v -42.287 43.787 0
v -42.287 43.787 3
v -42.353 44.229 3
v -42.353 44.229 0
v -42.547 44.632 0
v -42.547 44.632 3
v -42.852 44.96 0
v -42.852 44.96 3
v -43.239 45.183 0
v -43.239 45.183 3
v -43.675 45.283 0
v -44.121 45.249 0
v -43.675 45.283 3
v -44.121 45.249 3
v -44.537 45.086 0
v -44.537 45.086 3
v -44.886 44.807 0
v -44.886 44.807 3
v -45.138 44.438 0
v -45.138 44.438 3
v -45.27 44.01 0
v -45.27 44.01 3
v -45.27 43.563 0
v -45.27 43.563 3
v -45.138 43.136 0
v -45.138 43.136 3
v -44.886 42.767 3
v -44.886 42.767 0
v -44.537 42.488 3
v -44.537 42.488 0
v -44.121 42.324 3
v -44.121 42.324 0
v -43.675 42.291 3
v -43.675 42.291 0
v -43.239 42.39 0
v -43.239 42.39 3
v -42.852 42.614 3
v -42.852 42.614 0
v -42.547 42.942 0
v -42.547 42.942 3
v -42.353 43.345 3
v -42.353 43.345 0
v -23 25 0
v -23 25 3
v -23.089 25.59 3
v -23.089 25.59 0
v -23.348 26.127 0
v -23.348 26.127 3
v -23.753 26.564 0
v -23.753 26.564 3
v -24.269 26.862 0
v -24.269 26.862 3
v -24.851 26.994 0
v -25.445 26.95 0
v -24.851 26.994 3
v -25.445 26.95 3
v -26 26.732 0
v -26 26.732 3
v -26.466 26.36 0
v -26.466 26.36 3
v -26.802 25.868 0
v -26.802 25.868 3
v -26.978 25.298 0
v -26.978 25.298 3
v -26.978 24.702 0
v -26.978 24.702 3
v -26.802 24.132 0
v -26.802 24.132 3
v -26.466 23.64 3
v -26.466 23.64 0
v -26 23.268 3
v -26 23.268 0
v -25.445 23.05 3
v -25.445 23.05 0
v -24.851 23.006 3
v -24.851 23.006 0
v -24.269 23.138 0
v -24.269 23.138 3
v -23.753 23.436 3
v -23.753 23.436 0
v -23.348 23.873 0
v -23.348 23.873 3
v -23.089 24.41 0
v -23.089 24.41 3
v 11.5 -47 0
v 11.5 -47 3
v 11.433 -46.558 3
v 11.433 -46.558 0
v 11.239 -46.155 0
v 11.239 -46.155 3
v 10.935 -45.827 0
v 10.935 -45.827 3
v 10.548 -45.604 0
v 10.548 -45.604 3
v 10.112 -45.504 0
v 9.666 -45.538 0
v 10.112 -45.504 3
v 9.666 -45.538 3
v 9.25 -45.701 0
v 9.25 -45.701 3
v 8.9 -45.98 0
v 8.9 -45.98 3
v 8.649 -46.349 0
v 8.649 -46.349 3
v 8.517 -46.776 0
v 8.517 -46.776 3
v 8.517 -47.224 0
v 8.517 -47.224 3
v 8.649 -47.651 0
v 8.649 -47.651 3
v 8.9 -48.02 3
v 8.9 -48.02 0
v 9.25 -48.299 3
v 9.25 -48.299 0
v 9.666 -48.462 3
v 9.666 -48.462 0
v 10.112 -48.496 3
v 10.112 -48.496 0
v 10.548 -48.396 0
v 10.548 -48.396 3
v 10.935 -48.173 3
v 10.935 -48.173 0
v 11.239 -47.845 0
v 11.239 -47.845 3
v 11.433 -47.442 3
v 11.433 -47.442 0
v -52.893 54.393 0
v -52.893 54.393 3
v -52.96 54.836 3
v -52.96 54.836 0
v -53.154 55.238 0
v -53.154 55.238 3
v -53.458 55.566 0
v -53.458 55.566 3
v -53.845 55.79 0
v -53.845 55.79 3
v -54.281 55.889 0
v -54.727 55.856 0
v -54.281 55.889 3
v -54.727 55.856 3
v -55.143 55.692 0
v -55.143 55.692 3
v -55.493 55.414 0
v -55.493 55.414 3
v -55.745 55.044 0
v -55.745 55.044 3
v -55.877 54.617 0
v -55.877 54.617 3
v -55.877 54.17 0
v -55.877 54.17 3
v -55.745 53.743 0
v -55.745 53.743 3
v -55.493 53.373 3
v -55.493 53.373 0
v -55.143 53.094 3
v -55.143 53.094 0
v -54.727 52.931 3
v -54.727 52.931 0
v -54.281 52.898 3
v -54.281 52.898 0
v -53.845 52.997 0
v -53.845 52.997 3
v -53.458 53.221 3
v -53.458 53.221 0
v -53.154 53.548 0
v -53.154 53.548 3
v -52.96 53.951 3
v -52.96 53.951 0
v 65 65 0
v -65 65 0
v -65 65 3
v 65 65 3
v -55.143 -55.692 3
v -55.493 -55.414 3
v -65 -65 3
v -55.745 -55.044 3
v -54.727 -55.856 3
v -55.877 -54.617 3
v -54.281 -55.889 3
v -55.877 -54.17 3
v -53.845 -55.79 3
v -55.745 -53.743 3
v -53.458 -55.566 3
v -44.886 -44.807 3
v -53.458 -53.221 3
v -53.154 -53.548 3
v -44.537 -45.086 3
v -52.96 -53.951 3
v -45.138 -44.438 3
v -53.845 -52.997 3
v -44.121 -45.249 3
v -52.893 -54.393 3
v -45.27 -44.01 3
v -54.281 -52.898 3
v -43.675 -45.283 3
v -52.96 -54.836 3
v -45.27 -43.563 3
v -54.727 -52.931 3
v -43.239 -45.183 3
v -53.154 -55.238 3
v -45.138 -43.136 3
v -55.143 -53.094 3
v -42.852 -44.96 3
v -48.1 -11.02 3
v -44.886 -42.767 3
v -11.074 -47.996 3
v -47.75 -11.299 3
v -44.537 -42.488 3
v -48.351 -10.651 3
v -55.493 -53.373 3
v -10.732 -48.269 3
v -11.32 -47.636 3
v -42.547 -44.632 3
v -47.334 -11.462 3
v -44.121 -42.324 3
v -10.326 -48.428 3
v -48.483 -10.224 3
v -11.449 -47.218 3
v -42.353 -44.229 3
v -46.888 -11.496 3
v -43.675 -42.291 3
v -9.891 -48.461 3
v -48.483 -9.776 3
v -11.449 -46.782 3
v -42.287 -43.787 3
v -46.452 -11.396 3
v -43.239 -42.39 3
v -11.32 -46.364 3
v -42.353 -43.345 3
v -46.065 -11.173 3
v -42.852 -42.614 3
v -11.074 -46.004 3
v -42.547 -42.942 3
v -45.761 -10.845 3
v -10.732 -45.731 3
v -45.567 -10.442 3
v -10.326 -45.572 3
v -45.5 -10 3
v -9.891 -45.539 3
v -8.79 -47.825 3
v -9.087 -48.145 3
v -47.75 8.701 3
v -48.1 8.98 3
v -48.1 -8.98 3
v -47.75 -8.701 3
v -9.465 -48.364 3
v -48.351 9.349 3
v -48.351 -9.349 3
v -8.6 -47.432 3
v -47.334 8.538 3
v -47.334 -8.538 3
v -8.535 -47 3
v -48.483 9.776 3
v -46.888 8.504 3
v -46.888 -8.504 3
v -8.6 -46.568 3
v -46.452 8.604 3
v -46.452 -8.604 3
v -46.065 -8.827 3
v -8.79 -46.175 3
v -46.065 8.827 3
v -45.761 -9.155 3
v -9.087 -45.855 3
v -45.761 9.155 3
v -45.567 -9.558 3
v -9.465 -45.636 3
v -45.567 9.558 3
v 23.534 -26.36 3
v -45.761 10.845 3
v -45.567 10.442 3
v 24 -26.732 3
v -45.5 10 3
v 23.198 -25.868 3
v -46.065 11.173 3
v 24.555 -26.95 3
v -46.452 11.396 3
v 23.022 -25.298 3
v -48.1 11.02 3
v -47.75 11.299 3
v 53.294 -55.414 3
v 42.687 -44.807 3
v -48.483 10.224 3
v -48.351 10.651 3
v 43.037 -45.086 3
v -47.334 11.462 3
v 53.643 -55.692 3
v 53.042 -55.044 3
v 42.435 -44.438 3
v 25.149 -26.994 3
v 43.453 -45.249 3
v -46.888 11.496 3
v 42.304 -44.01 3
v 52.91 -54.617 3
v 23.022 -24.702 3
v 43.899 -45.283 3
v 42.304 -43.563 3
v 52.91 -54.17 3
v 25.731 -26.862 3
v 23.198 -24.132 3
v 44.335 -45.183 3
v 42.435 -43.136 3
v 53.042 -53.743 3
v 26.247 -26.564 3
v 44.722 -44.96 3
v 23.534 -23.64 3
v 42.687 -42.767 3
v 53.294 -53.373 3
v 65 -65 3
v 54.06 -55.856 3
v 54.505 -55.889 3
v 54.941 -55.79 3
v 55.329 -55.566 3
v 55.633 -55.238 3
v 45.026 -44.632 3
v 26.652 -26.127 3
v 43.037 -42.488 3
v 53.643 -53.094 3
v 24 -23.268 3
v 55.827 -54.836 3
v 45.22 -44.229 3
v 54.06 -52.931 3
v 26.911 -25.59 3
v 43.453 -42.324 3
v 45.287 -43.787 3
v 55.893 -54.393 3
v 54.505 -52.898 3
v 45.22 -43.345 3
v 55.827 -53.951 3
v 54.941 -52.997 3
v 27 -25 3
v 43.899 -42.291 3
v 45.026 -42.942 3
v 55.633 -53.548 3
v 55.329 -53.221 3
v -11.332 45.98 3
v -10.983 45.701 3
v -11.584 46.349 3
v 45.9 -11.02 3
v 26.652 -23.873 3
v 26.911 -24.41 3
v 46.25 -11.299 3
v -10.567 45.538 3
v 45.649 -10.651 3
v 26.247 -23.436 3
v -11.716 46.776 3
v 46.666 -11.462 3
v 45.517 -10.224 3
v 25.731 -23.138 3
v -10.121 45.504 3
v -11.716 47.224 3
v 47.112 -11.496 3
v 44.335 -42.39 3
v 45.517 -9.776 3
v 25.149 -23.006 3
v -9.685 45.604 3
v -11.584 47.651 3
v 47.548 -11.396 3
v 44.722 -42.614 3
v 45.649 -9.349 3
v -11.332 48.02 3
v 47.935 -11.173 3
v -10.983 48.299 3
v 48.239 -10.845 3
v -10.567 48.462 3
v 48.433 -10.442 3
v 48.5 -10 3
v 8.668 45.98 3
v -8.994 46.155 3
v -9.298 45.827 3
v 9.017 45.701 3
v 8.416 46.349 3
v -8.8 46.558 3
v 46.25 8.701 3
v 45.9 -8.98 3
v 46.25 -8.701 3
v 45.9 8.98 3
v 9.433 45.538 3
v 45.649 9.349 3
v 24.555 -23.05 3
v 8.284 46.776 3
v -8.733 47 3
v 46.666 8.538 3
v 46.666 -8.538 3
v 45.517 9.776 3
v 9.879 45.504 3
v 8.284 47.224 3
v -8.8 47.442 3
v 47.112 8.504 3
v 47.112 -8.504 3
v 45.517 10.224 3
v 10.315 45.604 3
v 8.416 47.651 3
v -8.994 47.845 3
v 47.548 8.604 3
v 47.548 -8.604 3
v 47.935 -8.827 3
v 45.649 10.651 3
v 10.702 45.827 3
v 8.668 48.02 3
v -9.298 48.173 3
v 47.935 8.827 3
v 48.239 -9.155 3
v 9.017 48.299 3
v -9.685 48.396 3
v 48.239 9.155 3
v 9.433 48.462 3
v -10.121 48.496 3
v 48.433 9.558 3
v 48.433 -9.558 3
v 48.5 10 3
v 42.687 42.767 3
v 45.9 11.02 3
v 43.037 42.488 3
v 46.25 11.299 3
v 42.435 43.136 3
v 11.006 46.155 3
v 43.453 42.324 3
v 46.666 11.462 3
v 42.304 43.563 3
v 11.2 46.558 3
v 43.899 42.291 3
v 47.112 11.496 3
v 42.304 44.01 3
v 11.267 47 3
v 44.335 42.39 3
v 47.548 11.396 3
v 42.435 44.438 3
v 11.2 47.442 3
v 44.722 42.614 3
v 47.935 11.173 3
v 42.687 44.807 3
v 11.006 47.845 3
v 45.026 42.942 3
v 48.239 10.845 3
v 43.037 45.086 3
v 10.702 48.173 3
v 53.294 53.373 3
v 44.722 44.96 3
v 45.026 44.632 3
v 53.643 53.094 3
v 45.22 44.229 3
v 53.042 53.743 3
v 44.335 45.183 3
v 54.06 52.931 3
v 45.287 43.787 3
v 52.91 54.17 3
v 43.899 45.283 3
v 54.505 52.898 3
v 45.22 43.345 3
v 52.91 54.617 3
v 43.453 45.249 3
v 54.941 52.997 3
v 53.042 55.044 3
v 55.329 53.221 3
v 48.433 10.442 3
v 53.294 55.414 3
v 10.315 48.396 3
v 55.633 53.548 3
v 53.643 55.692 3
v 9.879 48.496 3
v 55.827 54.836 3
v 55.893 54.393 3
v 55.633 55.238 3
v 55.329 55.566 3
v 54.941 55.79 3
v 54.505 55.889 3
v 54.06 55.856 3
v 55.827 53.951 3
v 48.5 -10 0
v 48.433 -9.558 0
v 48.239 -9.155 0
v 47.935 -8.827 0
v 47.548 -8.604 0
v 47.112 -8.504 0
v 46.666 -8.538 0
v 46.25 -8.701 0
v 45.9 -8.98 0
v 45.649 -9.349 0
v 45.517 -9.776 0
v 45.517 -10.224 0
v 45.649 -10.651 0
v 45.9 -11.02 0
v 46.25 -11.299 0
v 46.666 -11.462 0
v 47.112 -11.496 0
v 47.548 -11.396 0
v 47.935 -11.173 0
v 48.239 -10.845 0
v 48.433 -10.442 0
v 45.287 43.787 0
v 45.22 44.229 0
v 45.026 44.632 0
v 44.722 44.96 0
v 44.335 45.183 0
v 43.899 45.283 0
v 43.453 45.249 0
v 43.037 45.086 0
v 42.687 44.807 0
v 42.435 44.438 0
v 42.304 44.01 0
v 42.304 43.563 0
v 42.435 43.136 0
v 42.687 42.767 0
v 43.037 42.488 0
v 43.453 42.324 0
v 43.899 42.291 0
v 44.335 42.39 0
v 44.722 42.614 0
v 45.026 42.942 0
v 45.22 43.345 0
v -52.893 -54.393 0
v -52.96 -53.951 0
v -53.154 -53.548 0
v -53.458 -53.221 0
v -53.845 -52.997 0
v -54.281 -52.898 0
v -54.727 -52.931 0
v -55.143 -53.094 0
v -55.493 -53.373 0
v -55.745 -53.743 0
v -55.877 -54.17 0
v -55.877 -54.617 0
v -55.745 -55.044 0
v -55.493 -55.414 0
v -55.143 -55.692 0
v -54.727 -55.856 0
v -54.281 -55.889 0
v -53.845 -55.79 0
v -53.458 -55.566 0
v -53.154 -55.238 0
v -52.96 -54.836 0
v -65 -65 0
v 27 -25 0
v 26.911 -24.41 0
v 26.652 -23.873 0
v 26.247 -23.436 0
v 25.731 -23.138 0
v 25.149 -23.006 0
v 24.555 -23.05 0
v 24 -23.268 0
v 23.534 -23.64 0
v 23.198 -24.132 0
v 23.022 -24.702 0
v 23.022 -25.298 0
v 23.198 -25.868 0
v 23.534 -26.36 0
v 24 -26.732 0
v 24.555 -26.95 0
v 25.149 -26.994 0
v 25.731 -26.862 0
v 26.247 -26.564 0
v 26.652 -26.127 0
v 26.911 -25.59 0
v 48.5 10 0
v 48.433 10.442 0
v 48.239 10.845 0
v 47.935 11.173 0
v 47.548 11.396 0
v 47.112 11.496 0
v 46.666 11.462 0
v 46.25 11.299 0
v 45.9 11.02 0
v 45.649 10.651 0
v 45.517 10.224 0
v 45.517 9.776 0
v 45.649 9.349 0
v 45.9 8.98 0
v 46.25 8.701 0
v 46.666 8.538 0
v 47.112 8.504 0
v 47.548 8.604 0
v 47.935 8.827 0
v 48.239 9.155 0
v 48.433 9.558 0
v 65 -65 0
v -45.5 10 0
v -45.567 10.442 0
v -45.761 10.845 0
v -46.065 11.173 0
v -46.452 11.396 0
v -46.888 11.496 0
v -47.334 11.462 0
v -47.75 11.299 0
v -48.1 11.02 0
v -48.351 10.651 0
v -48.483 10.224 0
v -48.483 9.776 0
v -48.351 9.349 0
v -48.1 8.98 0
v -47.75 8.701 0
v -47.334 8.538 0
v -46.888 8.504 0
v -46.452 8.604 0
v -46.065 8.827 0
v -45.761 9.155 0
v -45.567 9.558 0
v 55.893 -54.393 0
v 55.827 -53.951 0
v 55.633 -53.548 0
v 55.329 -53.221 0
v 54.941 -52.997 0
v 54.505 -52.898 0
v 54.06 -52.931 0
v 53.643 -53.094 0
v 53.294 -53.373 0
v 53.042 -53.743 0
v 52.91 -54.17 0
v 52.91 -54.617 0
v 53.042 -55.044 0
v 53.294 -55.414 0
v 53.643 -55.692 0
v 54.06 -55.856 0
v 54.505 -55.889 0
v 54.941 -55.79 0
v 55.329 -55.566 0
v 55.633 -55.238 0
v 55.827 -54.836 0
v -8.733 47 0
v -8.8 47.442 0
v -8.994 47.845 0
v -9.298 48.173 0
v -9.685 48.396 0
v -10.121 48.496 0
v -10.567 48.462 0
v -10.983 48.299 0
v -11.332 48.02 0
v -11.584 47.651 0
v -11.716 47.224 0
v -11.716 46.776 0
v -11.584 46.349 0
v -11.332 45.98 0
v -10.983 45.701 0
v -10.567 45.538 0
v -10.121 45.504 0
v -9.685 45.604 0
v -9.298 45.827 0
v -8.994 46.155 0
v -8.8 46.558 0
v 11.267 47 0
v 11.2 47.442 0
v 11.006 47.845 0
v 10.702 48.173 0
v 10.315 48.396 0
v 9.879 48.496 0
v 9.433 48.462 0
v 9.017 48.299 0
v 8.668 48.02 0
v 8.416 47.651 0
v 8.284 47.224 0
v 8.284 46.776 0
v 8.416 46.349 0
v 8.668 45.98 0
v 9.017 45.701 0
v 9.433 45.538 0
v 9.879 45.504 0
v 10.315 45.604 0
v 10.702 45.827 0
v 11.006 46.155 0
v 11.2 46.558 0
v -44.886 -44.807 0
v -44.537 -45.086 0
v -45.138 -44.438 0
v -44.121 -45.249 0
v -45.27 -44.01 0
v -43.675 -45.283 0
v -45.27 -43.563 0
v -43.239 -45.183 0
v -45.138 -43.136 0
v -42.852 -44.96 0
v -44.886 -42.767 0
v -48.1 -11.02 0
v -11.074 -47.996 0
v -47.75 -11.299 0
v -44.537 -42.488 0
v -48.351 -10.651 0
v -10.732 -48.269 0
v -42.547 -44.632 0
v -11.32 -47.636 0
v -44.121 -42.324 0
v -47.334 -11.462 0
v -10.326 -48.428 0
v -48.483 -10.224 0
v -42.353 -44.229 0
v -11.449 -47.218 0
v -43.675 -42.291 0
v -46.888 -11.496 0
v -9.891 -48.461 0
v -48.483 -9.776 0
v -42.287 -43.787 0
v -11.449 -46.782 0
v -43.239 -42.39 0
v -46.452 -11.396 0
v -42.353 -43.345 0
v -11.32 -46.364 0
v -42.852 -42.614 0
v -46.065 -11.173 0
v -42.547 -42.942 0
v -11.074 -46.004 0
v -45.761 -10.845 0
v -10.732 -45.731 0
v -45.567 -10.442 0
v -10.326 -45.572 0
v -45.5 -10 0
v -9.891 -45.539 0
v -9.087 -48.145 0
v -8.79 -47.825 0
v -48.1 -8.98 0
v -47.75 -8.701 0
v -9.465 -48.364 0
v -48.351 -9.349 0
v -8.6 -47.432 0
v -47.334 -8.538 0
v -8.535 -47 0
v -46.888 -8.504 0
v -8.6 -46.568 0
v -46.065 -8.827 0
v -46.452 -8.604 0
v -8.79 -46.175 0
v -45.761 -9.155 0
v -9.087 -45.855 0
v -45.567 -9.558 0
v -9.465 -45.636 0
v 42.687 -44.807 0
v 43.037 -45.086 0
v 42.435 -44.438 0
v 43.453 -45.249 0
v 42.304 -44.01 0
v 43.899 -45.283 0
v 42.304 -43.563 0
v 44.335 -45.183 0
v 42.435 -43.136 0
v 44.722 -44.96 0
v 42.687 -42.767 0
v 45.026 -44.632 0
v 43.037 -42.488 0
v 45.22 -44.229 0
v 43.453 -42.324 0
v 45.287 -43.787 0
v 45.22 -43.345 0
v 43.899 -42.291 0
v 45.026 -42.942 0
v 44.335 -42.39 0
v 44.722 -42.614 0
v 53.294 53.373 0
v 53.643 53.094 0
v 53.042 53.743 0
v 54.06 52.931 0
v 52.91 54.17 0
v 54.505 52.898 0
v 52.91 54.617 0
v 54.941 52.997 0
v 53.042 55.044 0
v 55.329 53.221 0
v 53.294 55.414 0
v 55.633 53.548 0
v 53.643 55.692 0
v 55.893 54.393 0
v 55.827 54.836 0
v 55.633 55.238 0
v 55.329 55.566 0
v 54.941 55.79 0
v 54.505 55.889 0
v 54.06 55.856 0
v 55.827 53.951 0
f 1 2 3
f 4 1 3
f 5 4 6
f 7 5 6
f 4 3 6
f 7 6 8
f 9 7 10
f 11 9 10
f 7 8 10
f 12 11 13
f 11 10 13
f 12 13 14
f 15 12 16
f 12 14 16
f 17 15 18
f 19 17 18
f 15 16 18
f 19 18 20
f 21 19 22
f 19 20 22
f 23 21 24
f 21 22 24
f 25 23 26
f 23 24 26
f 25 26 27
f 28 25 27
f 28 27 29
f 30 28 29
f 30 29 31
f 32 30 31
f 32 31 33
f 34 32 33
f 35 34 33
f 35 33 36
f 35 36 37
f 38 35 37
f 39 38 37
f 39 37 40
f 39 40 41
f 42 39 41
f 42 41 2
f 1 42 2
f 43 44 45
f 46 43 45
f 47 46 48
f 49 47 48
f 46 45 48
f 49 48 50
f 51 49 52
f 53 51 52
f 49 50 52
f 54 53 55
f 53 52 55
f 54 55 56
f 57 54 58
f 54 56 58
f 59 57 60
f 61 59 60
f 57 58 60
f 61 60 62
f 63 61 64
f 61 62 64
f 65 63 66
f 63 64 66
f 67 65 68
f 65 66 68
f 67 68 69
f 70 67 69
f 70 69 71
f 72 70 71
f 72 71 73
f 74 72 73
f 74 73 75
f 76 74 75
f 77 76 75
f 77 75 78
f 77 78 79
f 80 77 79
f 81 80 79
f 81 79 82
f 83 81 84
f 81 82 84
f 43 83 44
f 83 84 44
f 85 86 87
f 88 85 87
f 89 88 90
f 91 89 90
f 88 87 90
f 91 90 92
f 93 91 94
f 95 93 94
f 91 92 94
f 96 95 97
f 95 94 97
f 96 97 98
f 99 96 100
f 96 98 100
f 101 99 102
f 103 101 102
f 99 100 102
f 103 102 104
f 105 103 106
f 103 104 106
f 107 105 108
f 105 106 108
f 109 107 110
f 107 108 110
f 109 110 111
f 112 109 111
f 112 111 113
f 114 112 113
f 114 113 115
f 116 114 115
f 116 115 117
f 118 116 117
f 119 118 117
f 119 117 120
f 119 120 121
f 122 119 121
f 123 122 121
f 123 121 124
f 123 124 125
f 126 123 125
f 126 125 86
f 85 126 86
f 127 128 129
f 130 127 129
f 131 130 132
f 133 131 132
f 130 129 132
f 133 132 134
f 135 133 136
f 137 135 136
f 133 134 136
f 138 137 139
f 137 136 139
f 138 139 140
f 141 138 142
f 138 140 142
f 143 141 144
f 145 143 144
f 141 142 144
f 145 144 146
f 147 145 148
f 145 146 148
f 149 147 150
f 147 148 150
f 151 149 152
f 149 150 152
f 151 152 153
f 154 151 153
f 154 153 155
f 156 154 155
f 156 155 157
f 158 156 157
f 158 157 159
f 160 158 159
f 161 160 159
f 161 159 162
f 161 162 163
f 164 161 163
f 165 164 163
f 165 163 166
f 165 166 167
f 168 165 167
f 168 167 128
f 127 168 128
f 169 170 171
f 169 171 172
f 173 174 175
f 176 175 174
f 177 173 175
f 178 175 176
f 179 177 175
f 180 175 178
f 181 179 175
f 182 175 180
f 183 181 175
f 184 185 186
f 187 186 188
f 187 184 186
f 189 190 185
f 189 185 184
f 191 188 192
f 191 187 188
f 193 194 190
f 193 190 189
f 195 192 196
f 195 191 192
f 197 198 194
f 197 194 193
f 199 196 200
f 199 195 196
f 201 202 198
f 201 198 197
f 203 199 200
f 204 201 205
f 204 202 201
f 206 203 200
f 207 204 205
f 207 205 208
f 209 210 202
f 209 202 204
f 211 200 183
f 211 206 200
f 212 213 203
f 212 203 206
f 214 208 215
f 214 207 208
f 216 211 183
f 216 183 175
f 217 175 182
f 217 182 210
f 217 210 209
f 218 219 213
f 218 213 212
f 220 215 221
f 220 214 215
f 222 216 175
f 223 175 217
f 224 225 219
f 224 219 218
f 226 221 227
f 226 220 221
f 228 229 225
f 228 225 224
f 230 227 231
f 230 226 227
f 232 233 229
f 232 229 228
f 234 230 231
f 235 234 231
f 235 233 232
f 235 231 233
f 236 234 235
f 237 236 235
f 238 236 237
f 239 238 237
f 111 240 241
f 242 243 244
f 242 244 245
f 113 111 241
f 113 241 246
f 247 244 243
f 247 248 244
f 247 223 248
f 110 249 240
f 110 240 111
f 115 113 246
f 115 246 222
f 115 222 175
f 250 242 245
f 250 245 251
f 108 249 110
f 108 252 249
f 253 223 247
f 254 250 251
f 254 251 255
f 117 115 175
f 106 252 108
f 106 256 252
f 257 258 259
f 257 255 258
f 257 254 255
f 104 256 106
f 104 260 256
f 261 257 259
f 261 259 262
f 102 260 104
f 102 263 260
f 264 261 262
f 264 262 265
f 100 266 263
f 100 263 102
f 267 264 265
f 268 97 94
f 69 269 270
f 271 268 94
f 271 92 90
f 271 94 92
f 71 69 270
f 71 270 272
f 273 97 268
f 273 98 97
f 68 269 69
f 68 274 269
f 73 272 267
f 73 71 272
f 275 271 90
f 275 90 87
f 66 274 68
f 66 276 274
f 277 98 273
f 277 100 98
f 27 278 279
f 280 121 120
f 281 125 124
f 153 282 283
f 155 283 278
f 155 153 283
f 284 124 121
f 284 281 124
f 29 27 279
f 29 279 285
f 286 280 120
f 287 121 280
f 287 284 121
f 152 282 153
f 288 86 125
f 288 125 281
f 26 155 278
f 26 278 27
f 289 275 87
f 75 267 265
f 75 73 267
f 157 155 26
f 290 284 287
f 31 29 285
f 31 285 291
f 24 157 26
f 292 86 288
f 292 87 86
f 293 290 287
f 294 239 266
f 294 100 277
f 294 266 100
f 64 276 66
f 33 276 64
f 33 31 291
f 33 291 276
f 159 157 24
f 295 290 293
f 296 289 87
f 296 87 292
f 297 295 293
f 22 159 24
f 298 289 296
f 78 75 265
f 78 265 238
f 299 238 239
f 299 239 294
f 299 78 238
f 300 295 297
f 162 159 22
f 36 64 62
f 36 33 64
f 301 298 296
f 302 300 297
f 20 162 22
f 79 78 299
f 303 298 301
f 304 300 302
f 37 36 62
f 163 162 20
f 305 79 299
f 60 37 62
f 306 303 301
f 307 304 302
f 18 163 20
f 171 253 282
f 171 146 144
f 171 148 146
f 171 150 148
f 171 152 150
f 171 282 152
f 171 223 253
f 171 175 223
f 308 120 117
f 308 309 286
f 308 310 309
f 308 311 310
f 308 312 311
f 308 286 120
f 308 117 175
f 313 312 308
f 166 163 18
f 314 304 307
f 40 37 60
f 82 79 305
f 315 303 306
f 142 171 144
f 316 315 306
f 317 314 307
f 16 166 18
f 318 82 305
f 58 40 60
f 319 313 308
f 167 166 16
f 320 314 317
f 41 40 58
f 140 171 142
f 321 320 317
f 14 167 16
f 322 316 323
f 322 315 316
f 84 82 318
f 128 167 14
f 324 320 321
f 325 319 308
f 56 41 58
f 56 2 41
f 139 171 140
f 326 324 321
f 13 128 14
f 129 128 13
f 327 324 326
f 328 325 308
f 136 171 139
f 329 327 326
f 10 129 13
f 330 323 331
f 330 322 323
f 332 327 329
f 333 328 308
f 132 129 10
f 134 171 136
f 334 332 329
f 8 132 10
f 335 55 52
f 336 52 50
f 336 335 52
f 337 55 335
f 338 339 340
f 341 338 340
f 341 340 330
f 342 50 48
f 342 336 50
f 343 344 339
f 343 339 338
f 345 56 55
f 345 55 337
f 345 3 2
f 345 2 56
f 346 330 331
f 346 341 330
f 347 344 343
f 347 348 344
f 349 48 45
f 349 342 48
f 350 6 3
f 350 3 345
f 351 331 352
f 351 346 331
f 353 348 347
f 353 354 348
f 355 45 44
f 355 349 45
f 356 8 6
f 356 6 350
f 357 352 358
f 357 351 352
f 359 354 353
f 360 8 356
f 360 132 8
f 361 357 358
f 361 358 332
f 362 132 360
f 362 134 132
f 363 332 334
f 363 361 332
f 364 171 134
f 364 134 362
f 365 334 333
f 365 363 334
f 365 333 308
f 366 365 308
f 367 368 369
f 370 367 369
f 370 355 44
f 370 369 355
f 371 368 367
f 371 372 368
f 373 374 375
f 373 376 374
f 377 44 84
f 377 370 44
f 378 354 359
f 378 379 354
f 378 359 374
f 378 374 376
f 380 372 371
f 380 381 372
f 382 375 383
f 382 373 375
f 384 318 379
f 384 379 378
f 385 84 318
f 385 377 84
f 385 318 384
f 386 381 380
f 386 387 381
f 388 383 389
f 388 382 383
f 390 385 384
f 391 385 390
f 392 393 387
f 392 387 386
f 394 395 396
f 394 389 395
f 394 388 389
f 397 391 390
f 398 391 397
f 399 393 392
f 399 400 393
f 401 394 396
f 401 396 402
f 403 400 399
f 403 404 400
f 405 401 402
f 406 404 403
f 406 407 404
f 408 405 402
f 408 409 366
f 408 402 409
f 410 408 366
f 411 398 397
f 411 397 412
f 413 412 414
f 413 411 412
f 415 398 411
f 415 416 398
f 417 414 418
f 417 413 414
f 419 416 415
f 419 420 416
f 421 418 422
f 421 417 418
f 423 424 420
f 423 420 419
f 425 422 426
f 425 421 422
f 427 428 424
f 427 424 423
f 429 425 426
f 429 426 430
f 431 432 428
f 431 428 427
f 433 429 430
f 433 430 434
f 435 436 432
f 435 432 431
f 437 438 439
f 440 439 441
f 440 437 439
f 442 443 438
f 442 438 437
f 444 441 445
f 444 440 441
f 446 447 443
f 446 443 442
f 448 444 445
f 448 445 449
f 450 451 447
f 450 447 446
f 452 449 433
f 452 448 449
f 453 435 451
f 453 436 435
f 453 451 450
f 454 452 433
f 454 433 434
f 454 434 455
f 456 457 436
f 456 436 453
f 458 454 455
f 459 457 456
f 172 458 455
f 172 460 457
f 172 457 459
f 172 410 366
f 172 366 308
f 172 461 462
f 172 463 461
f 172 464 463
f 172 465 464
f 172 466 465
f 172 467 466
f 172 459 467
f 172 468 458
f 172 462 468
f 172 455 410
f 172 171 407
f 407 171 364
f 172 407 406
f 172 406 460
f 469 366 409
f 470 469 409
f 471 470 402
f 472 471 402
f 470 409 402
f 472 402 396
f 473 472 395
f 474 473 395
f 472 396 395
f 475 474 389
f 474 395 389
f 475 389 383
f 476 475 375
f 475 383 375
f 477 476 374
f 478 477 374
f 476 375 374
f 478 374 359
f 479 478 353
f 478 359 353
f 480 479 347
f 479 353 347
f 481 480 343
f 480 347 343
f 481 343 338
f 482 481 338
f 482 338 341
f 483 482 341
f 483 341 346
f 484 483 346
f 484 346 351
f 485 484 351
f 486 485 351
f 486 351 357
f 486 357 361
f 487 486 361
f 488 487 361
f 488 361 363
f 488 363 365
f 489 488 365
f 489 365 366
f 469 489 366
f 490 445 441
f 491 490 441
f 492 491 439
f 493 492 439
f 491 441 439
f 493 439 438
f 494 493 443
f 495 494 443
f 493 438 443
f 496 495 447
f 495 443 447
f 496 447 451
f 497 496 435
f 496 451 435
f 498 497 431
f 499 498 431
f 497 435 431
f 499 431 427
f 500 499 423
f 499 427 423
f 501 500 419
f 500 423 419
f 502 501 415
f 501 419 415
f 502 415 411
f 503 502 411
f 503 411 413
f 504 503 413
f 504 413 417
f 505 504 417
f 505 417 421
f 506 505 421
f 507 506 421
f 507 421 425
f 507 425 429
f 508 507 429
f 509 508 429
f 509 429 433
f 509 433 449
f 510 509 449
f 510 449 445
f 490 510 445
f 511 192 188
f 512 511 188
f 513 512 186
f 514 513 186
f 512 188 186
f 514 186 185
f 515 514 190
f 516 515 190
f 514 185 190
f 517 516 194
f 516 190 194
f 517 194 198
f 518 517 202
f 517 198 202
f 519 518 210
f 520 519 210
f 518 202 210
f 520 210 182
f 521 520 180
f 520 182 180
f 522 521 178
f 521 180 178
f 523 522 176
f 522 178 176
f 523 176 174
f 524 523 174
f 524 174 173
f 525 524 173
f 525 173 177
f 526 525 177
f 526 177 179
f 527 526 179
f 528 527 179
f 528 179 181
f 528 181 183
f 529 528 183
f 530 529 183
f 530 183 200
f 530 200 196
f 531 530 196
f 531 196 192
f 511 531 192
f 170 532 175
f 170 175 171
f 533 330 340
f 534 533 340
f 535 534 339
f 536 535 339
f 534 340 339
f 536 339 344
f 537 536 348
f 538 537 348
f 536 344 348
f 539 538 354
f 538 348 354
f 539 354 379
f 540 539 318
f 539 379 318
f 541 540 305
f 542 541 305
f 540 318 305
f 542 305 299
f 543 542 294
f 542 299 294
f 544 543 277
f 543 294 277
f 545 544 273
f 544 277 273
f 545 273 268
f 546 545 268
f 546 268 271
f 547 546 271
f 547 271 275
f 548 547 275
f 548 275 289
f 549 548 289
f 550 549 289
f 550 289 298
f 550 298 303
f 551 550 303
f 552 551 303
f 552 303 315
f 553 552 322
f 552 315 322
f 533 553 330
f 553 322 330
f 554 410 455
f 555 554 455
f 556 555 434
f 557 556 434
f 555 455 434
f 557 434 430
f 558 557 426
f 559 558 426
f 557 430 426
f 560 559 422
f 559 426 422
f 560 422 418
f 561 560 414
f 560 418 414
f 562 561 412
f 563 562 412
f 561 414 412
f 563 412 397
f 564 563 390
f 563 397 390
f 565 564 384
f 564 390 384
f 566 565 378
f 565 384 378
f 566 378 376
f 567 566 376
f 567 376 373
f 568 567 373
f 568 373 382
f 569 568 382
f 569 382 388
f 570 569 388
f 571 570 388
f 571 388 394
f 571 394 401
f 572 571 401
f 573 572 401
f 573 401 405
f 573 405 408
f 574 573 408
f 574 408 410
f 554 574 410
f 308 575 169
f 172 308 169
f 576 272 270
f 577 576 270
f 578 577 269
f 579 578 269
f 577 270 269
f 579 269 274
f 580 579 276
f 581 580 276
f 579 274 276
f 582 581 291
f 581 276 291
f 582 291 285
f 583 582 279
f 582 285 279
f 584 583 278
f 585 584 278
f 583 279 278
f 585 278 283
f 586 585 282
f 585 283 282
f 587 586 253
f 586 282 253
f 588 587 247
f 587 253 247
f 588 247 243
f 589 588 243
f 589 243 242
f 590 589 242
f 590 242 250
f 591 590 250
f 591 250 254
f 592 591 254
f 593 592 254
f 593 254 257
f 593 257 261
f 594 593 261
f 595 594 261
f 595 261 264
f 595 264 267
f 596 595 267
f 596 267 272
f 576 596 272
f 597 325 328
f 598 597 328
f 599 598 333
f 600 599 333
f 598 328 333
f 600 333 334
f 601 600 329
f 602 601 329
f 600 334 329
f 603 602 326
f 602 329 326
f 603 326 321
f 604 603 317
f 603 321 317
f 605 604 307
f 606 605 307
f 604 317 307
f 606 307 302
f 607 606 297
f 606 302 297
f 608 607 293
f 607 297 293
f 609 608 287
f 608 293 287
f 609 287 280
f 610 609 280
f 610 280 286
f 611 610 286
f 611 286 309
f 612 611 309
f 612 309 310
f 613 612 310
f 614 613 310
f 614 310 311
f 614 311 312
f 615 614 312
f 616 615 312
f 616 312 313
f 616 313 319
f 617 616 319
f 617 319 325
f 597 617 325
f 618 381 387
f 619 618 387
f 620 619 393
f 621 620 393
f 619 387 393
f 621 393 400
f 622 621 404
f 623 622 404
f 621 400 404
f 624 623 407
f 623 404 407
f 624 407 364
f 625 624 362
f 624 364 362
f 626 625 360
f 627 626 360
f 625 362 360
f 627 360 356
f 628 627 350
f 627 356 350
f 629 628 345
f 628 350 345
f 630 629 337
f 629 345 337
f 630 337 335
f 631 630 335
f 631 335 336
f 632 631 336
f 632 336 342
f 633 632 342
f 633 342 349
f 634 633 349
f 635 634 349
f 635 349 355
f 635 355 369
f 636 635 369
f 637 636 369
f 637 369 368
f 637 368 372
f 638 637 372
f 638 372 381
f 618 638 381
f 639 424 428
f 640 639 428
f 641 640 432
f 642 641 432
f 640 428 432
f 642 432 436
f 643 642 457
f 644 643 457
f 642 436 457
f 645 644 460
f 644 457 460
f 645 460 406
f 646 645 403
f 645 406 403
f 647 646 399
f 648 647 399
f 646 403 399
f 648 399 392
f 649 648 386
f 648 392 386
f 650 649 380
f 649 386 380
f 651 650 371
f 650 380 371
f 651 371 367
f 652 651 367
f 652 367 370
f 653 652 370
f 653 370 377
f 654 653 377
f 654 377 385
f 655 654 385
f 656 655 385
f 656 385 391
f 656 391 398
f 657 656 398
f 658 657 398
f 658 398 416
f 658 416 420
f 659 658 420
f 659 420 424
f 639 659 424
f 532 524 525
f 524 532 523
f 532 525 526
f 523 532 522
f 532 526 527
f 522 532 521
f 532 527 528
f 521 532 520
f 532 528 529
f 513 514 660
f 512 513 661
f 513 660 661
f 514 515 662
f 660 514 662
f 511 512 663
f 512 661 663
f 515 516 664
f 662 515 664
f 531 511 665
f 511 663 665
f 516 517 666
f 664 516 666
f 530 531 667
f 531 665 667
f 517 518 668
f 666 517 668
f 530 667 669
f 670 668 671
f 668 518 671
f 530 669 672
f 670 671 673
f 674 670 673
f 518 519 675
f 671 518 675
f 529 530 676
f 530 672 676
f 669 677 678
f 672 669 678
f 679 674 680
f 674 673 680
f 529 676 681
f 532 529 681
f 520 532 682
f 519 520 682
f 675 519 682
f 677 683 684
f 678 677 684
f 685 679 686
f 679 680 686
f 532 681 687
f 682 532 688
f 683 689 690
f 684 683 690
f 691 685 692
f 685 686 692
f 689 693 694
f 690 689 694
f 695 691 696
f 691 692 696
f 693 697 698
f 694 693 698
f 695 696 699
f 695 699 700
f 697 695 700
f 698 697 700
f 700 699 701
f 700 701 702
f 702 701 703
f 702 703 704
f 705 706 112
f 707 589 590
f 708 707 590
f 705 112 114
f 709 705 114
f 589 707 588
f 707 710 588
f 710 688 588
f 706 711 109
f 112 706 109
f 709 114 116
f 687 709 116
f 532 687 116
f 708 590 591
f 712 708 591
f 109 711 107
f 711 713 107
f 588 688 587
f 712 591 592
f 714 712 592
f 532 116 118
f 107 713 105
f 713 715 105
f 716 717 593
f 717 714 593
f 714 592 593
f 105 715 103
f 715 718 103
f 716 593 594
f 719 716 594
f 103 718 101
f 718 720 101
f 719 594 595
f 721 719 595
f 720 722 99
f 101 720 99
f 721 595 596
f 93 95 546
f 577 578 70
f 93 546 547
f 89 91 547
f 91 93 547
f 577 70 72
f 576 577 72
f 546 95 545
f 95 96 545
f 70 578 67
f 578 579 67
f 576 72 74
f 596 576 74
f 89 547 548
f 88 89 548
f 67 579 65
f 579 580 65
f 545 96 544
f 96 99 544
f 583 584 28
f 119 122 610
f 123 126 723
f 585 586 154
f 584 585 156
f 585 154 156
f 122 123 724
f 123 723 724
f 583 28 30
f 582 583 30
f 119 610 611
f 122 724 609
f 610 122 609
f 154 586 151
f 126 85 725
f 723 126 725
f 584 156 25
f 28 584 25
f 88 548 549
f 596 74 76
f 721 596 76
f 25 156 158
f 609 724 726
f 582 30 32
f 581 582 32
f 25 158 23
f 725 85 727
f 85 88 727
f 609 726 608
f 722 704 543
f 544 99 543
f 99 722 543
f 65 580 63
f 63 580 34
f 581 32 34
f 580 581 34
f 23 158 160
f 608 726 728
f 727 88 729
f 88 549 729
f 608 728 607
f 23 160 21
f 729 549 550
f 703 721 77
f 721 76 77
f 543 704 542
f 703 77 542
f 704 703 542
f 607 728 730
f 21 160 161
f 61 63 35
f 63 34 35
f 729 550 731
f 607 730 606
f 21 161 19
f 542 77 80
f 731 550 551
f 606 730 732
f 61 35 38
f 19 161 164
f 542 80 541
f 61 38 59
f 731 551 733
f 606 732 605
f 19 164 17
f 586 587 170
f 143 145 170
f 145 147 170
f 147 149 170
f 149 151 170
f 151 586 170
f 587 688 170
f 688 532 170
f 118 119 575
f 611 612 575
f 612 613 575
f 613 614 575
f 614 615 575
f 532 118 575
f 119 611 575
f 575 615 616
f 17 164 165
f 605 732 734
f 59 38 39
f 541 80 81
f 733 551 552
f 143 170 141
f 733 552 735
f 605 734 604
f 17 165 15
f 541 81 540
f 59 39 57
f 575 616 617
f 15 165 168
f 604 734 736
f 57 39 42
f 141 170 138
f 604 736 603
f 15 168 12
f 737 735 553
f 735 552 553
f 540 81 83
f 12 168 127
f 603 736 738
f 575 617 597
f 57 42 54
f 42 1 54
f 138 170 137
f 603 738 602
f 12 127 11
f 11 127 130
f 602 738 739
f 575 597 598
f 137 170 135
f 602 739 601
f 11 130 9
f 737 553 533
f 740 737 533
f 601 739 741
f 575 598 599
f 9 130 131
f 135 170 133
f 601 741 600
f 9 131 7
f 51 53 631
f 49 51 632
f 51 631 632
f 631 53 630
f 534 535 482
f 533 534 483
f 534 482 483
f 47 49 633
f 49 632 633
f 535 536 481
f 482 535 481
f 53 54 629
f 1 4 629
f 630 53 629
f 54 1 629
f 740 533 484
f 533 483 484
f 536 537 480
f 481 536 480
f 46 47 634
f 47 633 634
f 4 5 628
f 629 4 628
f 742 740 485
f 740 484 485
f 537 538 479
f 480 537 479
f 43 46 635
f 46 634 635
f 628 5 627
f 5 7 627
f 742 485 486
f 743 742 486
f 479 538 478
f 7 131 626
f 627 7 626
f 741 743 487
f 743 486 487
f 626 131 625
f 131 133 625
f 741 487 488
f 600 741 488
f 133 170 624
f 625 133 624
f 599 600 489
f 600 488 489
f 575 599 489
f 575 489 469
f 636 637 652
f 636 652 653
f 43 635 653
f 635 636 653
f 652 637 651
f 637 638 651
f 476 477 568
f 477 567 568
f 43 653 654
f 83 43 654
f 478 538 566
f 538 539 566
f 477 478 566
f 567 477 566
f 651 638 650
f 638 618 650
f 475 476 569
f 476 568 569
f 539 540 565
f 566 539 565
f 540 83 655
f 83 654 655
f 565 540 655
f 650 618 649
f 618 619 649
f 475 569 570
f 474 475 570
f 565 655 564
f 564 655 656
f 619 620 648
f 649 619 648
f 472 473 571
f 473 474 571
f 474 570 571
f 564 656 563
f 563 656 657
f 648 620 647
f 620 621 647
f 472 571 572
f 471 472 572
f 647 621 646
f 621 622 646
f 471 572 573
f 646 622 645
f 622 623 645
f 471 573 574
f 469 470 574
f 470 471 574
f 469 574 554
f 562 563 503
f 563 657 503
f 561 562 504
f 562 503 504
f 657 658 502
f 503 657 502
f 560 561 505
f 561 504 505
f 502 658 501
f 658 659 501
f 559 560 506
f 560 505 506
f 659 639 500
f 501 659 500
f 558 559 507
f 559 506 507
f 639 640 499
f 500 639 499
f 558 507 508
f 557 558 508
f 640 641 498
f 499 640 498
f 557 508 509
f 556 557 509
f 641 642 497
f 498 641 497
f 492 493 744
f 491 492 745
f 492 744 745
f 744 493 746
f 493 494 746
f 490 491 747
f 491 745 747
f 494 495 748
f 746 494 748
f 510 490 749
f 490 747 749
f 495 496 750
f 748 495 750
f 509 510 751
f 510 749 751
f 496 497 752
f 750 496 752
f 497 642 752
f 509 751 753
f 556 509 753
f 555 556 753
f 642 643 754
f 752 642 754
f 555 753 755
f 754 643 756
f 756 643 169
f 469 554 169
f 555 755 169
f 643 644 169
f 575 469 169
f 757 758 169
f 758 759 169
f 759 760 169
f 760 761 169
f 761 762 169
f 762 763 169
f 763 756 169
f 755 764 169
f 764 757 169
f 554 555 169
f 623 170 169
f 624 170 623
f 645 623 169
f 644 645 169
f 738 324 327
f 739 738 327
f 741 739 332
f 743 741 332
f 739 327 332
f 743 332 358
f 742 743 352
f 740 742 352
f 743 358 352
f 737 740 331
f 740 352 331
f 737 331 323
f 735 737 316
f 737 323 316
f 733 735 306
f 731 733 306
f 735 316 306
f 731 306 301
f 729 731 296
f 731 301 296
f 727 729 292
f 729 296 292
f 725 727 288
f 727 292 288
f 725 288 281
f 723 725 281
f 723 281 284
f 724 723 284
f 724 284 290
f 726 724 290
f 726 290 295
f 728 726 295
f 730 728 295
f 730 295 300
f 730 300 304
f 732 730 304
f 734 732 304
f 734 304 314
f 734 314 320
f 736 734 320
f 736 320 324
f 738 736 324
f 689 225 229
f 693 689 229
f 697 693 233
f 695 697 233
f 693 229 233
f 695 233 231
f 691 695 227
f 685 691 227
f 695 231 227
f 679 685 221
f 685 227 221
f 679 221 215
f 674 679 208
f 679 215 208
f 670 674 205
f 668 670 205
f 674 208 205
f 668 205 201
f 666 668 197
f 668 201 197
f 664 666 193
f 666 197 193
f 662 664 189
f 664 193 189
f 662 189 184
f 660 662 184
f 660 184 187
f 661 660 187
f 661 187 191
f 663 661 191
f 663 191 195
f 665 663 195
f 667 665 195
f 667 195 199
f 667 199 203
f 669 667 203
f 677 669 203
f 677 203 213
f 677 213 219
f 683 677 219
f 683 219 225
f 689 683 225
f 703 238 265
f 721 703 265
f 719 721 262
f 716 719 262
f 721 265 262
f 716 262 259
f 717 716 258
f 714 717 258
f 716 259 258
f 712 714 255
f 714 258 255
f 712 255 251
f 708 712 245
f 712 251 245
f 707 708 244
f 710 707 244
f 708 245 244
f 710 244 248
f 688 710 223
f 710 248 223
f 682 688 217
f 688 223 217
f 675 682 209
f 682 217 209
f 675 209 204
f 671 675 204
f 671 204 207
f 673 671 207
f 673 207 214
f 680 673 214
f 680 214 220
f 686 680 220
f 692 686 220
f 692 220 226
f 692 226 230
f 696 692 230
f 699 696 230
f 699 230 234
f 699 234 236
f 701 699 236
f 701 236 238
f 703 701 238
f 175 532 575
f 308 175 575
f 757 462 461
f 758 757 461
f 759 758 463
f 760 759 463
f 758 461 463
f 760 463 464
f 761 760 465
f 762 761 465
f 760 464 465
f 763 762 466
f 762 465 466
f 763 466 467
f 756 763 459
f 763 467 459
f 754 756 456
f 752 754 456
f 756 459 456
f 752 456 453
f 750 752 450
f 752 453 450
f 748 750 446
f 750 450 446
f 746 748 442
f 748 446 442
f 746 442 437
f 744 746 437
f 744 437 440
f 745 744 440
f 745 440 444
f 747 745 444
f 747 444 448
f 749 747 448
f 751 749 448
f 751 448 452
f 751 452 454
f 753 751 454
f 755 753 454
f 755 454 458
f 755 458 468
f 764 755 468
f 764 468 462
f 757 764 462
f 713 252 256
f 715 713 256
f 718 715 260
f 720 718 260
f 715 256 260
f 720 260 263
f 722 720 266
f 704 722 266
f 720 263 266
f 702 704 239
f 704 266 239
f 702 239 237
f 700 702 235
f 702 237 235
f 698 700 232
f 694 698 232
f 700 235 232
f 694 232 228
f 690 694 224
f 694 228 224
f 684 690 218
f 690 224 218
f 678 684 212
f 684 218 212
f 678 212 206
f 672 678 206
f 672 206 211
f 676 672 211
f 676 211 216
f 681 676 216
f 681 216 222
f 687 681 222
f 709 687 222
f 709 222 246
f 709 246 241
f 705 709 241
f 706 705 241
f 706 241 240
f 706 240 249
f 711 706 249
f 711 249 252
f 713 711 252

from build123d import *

# Parameters (mm, degrees)
SKETCH_1_W          = 130
SKETCH_1_H          = 130
EXTRUDE_1_DEPTH     = 3
SKETCH_5_R          = 2
CUT_EXTRUDE_4_DEPTH = 3
SKETCH_6_R          = 1.5
SKETCH_6_R_2        = 1.464964174
CUT_EXTRUDE_5_DEPTH = 10


with BuildPart() as part:
    # 草图1 → 凸台-拉伸1 (new body)
    with BuildSketch(Plane.XY):
        Rectangle(SKETCH_1_W, SKETCH_1_H)
    extrude(amount=EXTRUDE_1_DEPTH)

    # 草图5 → 切除-拉伸4 (cut)
    with BuildSketch(Plane.XY.offset(3)):
        with Locations((25, -25)):
            Circle(SKETCH_5_R)
        with Locations((-25, 25)):
            Circle(SKETCH_5_R)
    extrude(amount=-CUT_EXTRUDE_4_DEPTH, mode=Mode.SUBTRACT)

    # 草图6 → 切除-拉伸5 (cut)
    with BuildSketch(Plane.XY.offset(3)):
        with Locations((-54.393398282, 54.393398282)):
            Circle(SKETCH_6_R)
        with Locations((-43.786796564, 43.786796564)):
            Circle(SKETCH_6_R)
        with Locations((-10.232887384, 47)):
            Circle(SKETCH_6_R)
        with Locations((9.767112616, 47)):
            Circle(SKETCH_6_R)
        with Locations((43.786796564, 43.786796564)):
            Circle(SKETCH_6_R)
        with Locations((54.393398282, 54.393398282)):
            Circle(SKETCH_6_R)
        with Locations((-47, 10)):
            Circle(SKETCH_6_R)
        with Locations((-47, -10)):
            Circle(SKETCH_6_R)
        with Locations((47, -10)):
            Circle(SKETCH_6_R)
        with Locations((47, 10)):
            Circle(SKETCH_6_R)
        with Locations((-54.393398282, -54.393398282)):
            Circle(SKETCH_6_R)
        with Locations((-43.786796564, -43.786796564)):
            Circle(SKETCH_6_R)
        with Locations((-10, -47)):
            Circle(SKETCH_6_R_2)
        with Locations((10, -47)):
            Circle(SKETCH_6_R)
        with Locations((43.786796564, -43.786796564)):
            Circle(SKETCH_6_R)
        with Locations((54.393398282, -54.393398282)):
            Circle(SKETCH_6_R)
    extrude(amount=-CUT_EXTRUDE_5_DEPTH, mode=Mode.SUBTRACT)


solid = part.part
